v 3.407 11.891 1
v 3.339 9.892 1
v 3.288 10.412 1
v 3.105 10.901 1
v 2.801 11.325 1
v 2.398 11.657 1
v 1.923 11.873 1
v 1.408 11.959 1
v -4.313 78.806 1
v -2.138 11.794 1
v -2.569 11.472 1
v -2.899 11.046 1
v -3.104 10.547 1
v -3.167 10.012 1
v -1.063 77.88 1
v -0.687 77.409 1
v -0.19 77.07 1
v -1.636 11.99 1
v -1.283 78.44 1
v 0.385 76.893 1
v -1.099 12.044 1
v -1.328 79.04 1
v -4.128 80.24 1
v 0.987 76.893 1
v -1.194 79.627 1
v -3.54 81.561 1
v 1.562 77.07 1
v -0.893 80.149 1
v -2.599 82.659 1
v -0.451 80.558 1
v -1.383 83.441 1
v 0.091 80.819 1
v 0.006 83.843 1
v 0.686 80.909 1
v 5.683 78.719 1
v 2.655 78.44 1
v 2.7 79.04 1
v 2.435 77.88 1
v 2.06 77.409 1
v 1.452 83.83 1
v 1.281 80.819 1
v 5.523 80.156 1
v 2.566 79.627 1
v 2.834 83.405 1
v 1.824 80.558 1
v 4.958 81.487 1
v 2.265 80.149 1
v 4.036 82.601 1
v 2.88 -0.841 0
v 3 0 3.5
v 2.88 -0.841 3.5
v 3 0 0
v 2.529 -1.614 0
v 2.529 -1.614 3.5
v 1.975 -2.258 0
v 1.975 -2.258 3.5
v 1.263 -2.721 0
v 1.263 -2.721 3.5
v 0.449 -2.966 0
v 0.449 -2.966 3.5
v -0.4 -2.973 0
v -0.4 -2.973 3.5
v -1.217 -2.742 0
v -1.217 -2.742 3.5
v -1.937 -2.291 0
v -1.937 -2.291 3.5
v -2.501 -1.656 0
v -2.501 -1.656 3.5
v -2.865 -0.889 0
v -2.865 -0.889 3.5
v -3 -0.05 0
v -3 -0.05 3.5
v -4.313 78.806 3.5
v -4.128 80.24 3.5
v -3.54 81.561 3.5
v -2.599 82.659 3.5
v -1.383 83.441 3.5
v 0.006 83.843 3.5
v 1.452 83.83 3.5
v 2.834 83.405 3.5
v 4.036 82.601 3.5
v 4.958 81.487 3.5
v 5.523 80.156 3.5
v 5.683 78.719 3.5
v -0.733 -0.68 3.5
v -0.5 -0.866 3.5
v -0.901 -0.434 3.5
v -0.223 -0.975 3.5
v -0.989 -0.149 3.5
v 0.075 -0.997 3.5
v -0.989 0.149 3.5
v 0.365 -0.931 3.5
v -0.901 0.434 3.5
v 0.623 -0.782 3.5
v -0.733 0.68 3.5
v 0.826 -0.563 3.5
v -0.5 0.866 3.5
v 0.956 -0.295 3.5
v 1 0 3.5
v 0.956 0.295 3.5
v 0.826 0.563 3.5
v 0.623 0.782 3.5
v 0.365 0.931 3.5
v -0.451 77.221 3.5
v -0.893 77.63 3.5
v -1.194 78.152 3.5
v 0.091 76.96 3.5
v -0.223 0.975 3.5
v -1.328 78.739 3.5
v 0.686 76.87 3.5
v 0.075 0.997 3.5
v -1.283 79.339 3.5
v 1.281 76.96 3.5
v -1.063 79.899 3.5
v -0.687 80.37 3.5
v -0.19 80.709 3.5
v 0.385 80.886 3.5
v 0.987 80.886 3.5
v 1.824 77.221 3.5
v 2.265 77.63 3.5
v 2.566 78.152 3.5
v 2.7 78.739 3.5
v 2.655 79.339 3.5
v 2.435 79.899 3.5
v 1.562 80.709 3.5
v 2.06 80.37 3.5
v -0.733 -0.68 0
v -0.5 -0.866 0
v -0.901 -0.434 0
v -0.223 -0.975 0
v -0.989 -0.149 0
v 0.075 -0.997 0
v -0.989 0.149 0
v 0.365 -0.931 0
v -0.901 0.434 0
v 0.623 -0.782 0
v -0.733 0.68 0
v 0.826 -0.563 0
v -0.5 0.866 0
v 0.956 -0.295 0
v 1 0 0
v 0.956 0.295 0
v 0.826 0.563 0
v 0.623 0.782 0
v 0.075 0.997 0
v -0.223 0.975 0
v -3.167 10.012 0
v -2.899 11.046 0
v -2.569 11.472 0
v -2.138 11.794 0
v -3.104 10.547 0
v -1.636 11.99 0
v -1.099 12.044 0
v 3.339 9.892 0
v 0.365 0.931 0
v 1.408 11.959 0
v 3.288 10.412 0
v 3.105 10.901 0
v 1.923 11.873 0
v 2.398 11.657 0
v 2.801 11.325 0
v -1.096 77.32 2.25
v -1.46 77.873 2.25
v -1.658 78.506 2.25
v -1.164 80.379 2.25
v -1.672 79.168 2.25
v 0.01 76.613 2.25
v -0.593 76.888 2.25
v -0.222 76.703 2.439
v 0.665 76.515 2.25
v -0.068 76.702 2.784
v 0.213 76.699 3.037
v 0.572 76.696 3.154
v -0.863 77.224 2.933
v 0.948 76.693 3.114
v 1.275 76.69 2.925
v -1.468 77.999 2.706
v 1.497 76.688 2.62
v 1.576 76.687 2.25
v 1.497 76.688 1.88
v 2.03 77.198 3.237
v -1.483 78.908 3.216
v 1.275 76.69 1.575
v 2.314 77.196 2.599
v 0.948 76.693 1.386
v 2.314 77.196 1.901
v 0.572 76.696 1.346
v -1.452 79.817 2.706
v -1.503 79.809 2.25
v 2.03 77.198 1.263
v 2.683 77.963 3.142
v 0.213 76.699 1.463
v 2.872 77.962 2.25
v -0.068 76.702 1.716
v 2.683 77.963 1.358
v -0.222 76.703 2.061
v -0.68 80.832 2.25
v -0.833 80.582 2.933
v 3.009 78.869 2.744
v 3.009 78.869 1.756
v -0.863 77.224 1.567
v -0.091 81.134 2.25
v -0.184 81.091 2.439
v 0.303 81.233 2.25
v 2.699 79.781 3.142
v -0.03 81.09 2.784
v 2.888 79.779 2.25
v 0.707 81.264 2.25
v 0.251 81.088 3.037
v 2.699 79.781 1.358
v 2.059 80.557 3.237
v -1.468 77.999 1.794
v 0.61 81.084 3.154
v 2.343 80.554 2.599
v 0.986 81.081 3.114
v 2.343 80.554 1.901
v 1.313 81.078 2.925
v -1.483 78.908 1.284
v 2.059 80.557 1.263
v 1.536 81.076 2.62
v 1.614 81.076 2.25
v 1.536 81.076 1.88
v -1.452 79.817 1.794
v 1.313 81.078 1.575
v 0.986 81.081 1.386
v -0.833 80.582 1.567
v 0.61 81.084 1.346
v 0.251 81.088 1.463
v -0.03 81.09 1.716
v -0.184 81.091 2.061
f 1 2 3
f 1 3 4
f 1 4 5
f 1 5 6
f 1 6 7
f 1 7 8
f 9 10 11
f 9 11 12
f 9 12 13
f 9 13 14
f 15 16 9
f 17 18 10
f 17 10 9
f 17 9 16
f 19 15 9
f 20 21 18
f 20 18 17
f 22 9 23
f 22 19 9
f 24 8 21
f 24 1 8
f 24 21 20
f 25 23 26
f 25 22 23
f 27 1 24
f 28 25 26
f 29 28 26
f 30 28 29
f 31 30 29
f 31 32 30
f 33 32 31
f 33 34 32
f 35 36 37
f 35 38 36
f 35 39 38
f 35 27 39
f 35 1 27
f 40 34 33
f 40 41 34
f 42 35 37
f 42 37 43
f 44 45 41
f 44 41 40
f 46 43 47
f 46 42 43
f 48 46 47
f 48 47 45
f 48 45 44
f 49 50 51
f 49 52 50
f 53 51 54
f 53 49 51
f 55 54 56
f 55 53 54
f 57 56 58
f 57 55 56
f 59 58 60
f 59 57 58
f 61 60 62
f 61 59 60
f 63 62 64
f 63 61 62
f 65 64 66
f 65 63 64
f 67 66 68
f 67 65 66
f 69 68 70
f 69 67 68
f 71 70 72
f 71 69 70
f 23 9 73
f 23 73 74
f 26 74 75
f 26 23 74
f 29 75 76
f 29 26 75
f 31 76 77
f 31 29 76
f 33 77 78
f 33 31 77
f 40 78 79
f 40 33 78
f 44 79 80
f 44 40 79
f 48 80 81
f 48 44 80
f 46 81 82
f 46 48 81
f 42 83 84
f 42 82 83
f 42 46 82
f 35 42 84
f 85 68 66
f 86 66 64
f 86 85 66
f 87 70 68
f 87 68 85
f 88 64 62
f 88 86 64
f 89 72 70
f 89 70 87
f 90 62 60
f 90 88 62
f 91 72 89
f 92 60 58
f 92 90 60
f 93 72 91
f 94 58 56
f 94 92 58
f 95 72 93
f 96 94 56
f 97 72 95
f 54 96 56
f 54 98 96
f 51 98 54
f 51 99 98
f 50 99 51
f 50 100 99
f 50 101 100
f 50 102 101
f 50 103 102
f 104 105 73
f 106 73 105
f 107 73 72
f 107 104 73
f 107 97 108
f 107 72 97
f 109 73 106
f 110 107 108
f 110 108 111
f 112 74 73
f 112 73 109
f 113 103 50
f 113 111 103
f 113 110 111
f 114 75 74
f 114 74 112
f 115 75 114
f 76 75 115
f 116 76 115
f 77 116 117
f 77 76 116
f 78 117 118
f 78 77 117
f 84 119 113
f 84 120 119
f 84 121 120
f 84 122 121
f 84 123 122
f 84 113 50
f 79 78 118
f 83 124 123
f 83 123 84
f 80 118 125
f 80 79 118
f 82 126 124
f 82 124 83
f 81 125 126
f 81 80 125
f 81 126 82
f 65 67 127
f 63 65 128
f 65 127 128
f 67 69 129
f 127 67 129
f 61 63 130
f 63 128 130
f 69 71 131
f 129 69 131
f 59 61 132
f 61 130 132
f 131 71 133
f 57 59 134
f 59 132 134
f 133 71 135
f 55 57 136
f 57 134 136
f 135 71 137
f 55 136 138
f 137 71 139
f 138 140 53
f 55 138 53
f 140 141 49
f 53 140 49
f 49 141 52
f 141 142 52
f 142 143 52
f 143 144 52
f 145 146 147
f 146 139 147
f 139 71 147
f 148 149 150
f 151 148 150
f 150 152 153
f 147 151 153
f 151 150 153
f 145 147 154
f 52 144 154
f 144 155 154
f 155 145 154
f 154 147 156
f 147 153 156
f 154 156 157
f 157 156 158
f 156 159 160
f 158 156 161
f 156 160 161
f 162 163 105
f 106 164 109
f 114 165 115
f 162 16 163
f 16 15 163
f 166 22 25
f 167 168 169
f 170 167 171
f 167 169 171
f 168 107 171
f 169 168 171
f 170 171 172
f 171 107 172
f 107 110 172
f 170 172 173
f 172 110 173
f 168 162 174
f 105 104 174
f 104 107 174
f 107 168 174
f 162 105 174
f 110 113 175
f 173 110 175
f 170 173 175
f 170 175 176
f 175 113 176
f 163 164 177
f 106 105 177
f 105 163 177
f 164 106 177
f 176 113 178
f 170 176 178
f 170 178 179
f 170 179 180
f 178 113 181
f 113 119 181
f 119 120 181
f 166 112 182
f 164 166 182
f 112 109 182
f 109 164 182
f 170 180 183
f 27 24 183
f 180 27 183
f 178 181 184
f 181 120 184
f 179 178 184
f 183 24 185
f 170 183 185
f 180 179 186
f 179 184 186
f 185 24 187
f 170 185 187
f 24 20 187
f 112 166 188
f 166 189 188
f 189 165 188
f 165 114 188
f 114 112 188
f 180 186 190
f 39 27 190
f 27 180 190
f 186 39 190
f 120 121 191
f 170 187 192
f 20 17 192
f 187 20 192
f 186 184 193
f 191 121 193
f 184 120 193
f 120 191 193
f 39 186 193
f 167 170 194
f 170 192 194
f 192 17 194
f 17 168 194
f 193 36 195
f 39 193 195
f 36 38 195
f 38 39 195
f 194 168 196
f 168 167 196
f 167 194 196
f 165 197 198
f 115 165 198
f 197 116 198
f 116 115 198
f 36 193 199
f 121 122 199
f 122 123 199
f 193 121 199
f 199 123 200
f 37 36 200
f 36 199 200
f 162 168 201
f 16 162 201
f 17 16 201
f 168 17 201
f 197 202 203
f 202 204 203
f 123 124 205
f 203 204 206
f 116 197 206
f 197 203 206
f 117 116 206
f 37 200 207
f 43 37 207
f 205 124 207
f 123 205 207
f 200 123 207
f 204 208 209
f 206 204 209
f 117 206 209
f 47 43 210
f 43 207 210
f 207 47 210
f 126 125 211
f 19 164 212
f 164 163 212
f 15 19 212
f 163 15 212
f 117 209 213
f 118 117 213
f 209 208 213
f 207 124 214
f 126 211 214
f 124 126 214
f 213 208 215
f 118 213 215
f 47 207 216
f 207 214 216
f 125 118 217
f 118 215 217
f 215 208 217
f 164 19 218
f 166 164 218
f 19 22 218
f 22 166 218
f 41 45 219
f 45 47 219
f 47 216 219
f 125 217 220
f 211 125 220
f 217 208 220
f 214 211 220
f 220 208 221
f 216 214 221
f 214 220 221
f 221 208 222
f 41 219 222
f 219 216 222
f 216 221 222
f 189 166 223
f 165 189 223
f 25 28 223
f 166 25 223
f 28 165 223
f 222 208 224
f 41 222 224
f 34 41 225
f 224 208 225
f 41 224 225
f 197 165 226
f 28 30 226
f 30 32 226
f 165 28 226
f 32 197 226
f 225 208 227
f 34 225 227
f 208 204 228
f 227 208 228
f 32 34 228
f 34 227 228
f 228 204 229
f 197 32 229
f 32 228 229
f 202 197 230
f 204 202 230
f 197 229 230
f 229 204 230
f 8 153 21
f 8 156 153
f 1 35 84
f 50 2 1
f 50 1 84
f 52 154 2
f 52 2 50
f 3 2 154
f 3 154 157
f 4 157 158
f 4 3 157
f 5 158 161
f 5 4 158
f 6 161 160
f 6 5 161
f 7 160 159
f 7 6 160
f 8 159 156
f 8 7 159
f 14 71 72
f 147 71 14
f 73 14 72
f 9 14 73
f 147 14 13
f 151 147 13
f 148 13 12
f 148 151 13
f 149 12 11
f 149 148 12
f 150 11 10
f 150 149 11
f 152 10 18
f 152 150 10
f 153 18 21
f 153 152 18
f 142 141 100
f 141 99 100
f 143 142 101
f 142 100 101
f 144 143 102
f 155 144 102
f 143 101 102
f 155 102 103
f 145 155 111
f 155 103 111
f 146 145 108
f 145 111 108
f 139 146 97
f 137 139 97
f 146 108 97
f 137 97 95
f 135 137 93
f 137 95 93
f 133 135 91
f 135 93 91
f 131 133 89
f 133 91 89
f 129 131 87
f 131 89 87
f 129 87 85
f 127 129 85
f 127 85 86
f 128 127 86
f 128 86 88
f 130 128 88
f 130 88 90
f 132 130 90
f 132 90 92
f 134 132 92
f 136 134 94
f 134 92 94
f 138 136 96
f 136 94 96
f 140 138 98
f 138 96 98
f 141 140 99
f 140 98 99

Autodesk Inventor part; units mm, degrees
ref_plane "YZ Plane" through (0, 0, 0) normal (1, 0, 0) x (0, 1, 0)
ref_plane "XZ Plane" through (0, 0, 0) normal (0, 1, 0) x (-1, 0, 0)
ref_plane "XY Plane" through (0, 0, 0) normal (0, 0, 1) x (1, 0, 0)
sketch "Sketch1" plane through (0, 0, 0) normal (0, 0, 1) x (1, 0, 0)
  circle A0 centre (0, 0) radius 0.5
  spline S0 degree 3 poles (0.2195, 78.8895) (0.2199, 78.9523) (0.2329, 79.0192) (0.2847, 79.142) (0.3236, 79.198) (0.413, 79.2862) (0.4694, 79.3243) (0.5929, 79.3745) (0.66, 79.3866) (0.7856, 79.3858) (0.8524, 79.3728) (0.9753, 79.321) (1.0313, 79.2822) (1.1195, 79.1928) (1.1576, 79.1363) (1.2078, 79.0128) (1.2199, 78.9458) (1.2191, 78.8202) (1.2061, 78.7533) (1.1543, 78.6305) (1.1154, 78.5745) (1.0261, 78.4863) (0.9696, 78.4482) (0.8461, 78.398) (0.779, 78.3858) (0.6535, 78.3867) (0.5866, 78.3996) (0.4637, 78.4515) (0.4078, 78.4903) (0.3196, 78.5797) (0.2815, 78.6362) (0.2312, 78.7597) (0.2191, 78.8267) (0.2195, 78.8895) knots 0 0 0 0 0.0625 0.0625 0.125 0.125 0.1875 0.1875 0.25 0.25 0.3125 0.3125 0.375 0.375 0.4375 0.4375 0.5 0.5 0.5625 0.5625 0.625 0.625 0.6875 0.6875 0.75 0.75 0.8125 0.8125 0.875 0.875 0.9375 0.9375 1 1 1 1
  line L0 (0.6862, 78.8895) -> (0, 0)
  circle A1 centre (0, 0) radius 3
  circle A2 centre (0.6862, 78.8895) radius 5
  line L1 (5.6833, 78.7193) -> (2.9983, -0.1021)
  line L2 (-2.9996, -0.05) -> (-4.3131, 78.8063)
  circle A3 centre (0, 0) radius 0.75
  point P0 (0, 0)
  point P1 (0.2195, 78.8895)
  dimension "d0" = 6
  dimension "d1" = 10
  dimension "d12" = 1.5
extrude "Extrusion1" add sketch "Sketch1" along normal blind 3.5 contours A2 L1 A1 L0 | L0 A1 L2 A2 | A2 | A1 | A3
sketch "Sketch2" plane through (5.6833, 78.7193, 3.5) normal (0.9994203, -0.0340447, 0) x (0, 0, -1)
  line L0 (3.5, -66.8672) -> (2.5, -66.8672)
  line L1 (2.5, -66.8672) -> (2.5, 7.5211)
  line L2 (2.5, 7.5211) -> (3.5, 7.5211)
  line L3 (3.5, 7.5211) -> (3.5, -66.8672)
  line L4 (3.5, -81.8672) -> (0, -81.8672) projected
  line L5 (3.5, -78.8672) -> (3.5, 0) projected
  dimension "d4" = 1
  dimension "d5" = 15
extrude "Extrusion2" cut sketch "Sketch2" against normal through all
fillet "Fillet1" radius 2 2 edges at (3.4068, 11.8909, 0.5) (-3.2022, 12.116, 0.5)
ref_plane "Work Plane1" through (0.6862, 78.8895, 2.25) normal (0, 0, -1) x (-0.9999622, 0.0086975, 0)
sketch "Sketch3" plane through (0.6862, 78.8895, 2.25) normal (0, 0, -1) x (-0.9999622, 0.0086975, 0)
  arc A0 (0, -2.375) -> (0, 2.375) centre (0, 0) ccw
  line L0 (0, 2.375) -> (0, -2.375)
  point P0 (0, -78.8925)
  dimension "d10" = 4.75
revolve "Revolution1" cut sketch "Sketch3" angle 360 about axis through (0.7068, 81.2645, 2.25) along (-0.0086975, -0.9999622, 0)
sketch "Sketch4" plane through (0, 0, 3.5) normal (0, 0, 1) x (1, 0, 0)
  circle A0 centre (0, 0) radius 0.5 projected
  circle A1 centre (0, 0) radius 1
  point P0 (0, 0)
  dimension "d13" = 2
extrude "Extrusion3" cut sketch "Sketch4" against normal through all
properties part number "RightArm"
